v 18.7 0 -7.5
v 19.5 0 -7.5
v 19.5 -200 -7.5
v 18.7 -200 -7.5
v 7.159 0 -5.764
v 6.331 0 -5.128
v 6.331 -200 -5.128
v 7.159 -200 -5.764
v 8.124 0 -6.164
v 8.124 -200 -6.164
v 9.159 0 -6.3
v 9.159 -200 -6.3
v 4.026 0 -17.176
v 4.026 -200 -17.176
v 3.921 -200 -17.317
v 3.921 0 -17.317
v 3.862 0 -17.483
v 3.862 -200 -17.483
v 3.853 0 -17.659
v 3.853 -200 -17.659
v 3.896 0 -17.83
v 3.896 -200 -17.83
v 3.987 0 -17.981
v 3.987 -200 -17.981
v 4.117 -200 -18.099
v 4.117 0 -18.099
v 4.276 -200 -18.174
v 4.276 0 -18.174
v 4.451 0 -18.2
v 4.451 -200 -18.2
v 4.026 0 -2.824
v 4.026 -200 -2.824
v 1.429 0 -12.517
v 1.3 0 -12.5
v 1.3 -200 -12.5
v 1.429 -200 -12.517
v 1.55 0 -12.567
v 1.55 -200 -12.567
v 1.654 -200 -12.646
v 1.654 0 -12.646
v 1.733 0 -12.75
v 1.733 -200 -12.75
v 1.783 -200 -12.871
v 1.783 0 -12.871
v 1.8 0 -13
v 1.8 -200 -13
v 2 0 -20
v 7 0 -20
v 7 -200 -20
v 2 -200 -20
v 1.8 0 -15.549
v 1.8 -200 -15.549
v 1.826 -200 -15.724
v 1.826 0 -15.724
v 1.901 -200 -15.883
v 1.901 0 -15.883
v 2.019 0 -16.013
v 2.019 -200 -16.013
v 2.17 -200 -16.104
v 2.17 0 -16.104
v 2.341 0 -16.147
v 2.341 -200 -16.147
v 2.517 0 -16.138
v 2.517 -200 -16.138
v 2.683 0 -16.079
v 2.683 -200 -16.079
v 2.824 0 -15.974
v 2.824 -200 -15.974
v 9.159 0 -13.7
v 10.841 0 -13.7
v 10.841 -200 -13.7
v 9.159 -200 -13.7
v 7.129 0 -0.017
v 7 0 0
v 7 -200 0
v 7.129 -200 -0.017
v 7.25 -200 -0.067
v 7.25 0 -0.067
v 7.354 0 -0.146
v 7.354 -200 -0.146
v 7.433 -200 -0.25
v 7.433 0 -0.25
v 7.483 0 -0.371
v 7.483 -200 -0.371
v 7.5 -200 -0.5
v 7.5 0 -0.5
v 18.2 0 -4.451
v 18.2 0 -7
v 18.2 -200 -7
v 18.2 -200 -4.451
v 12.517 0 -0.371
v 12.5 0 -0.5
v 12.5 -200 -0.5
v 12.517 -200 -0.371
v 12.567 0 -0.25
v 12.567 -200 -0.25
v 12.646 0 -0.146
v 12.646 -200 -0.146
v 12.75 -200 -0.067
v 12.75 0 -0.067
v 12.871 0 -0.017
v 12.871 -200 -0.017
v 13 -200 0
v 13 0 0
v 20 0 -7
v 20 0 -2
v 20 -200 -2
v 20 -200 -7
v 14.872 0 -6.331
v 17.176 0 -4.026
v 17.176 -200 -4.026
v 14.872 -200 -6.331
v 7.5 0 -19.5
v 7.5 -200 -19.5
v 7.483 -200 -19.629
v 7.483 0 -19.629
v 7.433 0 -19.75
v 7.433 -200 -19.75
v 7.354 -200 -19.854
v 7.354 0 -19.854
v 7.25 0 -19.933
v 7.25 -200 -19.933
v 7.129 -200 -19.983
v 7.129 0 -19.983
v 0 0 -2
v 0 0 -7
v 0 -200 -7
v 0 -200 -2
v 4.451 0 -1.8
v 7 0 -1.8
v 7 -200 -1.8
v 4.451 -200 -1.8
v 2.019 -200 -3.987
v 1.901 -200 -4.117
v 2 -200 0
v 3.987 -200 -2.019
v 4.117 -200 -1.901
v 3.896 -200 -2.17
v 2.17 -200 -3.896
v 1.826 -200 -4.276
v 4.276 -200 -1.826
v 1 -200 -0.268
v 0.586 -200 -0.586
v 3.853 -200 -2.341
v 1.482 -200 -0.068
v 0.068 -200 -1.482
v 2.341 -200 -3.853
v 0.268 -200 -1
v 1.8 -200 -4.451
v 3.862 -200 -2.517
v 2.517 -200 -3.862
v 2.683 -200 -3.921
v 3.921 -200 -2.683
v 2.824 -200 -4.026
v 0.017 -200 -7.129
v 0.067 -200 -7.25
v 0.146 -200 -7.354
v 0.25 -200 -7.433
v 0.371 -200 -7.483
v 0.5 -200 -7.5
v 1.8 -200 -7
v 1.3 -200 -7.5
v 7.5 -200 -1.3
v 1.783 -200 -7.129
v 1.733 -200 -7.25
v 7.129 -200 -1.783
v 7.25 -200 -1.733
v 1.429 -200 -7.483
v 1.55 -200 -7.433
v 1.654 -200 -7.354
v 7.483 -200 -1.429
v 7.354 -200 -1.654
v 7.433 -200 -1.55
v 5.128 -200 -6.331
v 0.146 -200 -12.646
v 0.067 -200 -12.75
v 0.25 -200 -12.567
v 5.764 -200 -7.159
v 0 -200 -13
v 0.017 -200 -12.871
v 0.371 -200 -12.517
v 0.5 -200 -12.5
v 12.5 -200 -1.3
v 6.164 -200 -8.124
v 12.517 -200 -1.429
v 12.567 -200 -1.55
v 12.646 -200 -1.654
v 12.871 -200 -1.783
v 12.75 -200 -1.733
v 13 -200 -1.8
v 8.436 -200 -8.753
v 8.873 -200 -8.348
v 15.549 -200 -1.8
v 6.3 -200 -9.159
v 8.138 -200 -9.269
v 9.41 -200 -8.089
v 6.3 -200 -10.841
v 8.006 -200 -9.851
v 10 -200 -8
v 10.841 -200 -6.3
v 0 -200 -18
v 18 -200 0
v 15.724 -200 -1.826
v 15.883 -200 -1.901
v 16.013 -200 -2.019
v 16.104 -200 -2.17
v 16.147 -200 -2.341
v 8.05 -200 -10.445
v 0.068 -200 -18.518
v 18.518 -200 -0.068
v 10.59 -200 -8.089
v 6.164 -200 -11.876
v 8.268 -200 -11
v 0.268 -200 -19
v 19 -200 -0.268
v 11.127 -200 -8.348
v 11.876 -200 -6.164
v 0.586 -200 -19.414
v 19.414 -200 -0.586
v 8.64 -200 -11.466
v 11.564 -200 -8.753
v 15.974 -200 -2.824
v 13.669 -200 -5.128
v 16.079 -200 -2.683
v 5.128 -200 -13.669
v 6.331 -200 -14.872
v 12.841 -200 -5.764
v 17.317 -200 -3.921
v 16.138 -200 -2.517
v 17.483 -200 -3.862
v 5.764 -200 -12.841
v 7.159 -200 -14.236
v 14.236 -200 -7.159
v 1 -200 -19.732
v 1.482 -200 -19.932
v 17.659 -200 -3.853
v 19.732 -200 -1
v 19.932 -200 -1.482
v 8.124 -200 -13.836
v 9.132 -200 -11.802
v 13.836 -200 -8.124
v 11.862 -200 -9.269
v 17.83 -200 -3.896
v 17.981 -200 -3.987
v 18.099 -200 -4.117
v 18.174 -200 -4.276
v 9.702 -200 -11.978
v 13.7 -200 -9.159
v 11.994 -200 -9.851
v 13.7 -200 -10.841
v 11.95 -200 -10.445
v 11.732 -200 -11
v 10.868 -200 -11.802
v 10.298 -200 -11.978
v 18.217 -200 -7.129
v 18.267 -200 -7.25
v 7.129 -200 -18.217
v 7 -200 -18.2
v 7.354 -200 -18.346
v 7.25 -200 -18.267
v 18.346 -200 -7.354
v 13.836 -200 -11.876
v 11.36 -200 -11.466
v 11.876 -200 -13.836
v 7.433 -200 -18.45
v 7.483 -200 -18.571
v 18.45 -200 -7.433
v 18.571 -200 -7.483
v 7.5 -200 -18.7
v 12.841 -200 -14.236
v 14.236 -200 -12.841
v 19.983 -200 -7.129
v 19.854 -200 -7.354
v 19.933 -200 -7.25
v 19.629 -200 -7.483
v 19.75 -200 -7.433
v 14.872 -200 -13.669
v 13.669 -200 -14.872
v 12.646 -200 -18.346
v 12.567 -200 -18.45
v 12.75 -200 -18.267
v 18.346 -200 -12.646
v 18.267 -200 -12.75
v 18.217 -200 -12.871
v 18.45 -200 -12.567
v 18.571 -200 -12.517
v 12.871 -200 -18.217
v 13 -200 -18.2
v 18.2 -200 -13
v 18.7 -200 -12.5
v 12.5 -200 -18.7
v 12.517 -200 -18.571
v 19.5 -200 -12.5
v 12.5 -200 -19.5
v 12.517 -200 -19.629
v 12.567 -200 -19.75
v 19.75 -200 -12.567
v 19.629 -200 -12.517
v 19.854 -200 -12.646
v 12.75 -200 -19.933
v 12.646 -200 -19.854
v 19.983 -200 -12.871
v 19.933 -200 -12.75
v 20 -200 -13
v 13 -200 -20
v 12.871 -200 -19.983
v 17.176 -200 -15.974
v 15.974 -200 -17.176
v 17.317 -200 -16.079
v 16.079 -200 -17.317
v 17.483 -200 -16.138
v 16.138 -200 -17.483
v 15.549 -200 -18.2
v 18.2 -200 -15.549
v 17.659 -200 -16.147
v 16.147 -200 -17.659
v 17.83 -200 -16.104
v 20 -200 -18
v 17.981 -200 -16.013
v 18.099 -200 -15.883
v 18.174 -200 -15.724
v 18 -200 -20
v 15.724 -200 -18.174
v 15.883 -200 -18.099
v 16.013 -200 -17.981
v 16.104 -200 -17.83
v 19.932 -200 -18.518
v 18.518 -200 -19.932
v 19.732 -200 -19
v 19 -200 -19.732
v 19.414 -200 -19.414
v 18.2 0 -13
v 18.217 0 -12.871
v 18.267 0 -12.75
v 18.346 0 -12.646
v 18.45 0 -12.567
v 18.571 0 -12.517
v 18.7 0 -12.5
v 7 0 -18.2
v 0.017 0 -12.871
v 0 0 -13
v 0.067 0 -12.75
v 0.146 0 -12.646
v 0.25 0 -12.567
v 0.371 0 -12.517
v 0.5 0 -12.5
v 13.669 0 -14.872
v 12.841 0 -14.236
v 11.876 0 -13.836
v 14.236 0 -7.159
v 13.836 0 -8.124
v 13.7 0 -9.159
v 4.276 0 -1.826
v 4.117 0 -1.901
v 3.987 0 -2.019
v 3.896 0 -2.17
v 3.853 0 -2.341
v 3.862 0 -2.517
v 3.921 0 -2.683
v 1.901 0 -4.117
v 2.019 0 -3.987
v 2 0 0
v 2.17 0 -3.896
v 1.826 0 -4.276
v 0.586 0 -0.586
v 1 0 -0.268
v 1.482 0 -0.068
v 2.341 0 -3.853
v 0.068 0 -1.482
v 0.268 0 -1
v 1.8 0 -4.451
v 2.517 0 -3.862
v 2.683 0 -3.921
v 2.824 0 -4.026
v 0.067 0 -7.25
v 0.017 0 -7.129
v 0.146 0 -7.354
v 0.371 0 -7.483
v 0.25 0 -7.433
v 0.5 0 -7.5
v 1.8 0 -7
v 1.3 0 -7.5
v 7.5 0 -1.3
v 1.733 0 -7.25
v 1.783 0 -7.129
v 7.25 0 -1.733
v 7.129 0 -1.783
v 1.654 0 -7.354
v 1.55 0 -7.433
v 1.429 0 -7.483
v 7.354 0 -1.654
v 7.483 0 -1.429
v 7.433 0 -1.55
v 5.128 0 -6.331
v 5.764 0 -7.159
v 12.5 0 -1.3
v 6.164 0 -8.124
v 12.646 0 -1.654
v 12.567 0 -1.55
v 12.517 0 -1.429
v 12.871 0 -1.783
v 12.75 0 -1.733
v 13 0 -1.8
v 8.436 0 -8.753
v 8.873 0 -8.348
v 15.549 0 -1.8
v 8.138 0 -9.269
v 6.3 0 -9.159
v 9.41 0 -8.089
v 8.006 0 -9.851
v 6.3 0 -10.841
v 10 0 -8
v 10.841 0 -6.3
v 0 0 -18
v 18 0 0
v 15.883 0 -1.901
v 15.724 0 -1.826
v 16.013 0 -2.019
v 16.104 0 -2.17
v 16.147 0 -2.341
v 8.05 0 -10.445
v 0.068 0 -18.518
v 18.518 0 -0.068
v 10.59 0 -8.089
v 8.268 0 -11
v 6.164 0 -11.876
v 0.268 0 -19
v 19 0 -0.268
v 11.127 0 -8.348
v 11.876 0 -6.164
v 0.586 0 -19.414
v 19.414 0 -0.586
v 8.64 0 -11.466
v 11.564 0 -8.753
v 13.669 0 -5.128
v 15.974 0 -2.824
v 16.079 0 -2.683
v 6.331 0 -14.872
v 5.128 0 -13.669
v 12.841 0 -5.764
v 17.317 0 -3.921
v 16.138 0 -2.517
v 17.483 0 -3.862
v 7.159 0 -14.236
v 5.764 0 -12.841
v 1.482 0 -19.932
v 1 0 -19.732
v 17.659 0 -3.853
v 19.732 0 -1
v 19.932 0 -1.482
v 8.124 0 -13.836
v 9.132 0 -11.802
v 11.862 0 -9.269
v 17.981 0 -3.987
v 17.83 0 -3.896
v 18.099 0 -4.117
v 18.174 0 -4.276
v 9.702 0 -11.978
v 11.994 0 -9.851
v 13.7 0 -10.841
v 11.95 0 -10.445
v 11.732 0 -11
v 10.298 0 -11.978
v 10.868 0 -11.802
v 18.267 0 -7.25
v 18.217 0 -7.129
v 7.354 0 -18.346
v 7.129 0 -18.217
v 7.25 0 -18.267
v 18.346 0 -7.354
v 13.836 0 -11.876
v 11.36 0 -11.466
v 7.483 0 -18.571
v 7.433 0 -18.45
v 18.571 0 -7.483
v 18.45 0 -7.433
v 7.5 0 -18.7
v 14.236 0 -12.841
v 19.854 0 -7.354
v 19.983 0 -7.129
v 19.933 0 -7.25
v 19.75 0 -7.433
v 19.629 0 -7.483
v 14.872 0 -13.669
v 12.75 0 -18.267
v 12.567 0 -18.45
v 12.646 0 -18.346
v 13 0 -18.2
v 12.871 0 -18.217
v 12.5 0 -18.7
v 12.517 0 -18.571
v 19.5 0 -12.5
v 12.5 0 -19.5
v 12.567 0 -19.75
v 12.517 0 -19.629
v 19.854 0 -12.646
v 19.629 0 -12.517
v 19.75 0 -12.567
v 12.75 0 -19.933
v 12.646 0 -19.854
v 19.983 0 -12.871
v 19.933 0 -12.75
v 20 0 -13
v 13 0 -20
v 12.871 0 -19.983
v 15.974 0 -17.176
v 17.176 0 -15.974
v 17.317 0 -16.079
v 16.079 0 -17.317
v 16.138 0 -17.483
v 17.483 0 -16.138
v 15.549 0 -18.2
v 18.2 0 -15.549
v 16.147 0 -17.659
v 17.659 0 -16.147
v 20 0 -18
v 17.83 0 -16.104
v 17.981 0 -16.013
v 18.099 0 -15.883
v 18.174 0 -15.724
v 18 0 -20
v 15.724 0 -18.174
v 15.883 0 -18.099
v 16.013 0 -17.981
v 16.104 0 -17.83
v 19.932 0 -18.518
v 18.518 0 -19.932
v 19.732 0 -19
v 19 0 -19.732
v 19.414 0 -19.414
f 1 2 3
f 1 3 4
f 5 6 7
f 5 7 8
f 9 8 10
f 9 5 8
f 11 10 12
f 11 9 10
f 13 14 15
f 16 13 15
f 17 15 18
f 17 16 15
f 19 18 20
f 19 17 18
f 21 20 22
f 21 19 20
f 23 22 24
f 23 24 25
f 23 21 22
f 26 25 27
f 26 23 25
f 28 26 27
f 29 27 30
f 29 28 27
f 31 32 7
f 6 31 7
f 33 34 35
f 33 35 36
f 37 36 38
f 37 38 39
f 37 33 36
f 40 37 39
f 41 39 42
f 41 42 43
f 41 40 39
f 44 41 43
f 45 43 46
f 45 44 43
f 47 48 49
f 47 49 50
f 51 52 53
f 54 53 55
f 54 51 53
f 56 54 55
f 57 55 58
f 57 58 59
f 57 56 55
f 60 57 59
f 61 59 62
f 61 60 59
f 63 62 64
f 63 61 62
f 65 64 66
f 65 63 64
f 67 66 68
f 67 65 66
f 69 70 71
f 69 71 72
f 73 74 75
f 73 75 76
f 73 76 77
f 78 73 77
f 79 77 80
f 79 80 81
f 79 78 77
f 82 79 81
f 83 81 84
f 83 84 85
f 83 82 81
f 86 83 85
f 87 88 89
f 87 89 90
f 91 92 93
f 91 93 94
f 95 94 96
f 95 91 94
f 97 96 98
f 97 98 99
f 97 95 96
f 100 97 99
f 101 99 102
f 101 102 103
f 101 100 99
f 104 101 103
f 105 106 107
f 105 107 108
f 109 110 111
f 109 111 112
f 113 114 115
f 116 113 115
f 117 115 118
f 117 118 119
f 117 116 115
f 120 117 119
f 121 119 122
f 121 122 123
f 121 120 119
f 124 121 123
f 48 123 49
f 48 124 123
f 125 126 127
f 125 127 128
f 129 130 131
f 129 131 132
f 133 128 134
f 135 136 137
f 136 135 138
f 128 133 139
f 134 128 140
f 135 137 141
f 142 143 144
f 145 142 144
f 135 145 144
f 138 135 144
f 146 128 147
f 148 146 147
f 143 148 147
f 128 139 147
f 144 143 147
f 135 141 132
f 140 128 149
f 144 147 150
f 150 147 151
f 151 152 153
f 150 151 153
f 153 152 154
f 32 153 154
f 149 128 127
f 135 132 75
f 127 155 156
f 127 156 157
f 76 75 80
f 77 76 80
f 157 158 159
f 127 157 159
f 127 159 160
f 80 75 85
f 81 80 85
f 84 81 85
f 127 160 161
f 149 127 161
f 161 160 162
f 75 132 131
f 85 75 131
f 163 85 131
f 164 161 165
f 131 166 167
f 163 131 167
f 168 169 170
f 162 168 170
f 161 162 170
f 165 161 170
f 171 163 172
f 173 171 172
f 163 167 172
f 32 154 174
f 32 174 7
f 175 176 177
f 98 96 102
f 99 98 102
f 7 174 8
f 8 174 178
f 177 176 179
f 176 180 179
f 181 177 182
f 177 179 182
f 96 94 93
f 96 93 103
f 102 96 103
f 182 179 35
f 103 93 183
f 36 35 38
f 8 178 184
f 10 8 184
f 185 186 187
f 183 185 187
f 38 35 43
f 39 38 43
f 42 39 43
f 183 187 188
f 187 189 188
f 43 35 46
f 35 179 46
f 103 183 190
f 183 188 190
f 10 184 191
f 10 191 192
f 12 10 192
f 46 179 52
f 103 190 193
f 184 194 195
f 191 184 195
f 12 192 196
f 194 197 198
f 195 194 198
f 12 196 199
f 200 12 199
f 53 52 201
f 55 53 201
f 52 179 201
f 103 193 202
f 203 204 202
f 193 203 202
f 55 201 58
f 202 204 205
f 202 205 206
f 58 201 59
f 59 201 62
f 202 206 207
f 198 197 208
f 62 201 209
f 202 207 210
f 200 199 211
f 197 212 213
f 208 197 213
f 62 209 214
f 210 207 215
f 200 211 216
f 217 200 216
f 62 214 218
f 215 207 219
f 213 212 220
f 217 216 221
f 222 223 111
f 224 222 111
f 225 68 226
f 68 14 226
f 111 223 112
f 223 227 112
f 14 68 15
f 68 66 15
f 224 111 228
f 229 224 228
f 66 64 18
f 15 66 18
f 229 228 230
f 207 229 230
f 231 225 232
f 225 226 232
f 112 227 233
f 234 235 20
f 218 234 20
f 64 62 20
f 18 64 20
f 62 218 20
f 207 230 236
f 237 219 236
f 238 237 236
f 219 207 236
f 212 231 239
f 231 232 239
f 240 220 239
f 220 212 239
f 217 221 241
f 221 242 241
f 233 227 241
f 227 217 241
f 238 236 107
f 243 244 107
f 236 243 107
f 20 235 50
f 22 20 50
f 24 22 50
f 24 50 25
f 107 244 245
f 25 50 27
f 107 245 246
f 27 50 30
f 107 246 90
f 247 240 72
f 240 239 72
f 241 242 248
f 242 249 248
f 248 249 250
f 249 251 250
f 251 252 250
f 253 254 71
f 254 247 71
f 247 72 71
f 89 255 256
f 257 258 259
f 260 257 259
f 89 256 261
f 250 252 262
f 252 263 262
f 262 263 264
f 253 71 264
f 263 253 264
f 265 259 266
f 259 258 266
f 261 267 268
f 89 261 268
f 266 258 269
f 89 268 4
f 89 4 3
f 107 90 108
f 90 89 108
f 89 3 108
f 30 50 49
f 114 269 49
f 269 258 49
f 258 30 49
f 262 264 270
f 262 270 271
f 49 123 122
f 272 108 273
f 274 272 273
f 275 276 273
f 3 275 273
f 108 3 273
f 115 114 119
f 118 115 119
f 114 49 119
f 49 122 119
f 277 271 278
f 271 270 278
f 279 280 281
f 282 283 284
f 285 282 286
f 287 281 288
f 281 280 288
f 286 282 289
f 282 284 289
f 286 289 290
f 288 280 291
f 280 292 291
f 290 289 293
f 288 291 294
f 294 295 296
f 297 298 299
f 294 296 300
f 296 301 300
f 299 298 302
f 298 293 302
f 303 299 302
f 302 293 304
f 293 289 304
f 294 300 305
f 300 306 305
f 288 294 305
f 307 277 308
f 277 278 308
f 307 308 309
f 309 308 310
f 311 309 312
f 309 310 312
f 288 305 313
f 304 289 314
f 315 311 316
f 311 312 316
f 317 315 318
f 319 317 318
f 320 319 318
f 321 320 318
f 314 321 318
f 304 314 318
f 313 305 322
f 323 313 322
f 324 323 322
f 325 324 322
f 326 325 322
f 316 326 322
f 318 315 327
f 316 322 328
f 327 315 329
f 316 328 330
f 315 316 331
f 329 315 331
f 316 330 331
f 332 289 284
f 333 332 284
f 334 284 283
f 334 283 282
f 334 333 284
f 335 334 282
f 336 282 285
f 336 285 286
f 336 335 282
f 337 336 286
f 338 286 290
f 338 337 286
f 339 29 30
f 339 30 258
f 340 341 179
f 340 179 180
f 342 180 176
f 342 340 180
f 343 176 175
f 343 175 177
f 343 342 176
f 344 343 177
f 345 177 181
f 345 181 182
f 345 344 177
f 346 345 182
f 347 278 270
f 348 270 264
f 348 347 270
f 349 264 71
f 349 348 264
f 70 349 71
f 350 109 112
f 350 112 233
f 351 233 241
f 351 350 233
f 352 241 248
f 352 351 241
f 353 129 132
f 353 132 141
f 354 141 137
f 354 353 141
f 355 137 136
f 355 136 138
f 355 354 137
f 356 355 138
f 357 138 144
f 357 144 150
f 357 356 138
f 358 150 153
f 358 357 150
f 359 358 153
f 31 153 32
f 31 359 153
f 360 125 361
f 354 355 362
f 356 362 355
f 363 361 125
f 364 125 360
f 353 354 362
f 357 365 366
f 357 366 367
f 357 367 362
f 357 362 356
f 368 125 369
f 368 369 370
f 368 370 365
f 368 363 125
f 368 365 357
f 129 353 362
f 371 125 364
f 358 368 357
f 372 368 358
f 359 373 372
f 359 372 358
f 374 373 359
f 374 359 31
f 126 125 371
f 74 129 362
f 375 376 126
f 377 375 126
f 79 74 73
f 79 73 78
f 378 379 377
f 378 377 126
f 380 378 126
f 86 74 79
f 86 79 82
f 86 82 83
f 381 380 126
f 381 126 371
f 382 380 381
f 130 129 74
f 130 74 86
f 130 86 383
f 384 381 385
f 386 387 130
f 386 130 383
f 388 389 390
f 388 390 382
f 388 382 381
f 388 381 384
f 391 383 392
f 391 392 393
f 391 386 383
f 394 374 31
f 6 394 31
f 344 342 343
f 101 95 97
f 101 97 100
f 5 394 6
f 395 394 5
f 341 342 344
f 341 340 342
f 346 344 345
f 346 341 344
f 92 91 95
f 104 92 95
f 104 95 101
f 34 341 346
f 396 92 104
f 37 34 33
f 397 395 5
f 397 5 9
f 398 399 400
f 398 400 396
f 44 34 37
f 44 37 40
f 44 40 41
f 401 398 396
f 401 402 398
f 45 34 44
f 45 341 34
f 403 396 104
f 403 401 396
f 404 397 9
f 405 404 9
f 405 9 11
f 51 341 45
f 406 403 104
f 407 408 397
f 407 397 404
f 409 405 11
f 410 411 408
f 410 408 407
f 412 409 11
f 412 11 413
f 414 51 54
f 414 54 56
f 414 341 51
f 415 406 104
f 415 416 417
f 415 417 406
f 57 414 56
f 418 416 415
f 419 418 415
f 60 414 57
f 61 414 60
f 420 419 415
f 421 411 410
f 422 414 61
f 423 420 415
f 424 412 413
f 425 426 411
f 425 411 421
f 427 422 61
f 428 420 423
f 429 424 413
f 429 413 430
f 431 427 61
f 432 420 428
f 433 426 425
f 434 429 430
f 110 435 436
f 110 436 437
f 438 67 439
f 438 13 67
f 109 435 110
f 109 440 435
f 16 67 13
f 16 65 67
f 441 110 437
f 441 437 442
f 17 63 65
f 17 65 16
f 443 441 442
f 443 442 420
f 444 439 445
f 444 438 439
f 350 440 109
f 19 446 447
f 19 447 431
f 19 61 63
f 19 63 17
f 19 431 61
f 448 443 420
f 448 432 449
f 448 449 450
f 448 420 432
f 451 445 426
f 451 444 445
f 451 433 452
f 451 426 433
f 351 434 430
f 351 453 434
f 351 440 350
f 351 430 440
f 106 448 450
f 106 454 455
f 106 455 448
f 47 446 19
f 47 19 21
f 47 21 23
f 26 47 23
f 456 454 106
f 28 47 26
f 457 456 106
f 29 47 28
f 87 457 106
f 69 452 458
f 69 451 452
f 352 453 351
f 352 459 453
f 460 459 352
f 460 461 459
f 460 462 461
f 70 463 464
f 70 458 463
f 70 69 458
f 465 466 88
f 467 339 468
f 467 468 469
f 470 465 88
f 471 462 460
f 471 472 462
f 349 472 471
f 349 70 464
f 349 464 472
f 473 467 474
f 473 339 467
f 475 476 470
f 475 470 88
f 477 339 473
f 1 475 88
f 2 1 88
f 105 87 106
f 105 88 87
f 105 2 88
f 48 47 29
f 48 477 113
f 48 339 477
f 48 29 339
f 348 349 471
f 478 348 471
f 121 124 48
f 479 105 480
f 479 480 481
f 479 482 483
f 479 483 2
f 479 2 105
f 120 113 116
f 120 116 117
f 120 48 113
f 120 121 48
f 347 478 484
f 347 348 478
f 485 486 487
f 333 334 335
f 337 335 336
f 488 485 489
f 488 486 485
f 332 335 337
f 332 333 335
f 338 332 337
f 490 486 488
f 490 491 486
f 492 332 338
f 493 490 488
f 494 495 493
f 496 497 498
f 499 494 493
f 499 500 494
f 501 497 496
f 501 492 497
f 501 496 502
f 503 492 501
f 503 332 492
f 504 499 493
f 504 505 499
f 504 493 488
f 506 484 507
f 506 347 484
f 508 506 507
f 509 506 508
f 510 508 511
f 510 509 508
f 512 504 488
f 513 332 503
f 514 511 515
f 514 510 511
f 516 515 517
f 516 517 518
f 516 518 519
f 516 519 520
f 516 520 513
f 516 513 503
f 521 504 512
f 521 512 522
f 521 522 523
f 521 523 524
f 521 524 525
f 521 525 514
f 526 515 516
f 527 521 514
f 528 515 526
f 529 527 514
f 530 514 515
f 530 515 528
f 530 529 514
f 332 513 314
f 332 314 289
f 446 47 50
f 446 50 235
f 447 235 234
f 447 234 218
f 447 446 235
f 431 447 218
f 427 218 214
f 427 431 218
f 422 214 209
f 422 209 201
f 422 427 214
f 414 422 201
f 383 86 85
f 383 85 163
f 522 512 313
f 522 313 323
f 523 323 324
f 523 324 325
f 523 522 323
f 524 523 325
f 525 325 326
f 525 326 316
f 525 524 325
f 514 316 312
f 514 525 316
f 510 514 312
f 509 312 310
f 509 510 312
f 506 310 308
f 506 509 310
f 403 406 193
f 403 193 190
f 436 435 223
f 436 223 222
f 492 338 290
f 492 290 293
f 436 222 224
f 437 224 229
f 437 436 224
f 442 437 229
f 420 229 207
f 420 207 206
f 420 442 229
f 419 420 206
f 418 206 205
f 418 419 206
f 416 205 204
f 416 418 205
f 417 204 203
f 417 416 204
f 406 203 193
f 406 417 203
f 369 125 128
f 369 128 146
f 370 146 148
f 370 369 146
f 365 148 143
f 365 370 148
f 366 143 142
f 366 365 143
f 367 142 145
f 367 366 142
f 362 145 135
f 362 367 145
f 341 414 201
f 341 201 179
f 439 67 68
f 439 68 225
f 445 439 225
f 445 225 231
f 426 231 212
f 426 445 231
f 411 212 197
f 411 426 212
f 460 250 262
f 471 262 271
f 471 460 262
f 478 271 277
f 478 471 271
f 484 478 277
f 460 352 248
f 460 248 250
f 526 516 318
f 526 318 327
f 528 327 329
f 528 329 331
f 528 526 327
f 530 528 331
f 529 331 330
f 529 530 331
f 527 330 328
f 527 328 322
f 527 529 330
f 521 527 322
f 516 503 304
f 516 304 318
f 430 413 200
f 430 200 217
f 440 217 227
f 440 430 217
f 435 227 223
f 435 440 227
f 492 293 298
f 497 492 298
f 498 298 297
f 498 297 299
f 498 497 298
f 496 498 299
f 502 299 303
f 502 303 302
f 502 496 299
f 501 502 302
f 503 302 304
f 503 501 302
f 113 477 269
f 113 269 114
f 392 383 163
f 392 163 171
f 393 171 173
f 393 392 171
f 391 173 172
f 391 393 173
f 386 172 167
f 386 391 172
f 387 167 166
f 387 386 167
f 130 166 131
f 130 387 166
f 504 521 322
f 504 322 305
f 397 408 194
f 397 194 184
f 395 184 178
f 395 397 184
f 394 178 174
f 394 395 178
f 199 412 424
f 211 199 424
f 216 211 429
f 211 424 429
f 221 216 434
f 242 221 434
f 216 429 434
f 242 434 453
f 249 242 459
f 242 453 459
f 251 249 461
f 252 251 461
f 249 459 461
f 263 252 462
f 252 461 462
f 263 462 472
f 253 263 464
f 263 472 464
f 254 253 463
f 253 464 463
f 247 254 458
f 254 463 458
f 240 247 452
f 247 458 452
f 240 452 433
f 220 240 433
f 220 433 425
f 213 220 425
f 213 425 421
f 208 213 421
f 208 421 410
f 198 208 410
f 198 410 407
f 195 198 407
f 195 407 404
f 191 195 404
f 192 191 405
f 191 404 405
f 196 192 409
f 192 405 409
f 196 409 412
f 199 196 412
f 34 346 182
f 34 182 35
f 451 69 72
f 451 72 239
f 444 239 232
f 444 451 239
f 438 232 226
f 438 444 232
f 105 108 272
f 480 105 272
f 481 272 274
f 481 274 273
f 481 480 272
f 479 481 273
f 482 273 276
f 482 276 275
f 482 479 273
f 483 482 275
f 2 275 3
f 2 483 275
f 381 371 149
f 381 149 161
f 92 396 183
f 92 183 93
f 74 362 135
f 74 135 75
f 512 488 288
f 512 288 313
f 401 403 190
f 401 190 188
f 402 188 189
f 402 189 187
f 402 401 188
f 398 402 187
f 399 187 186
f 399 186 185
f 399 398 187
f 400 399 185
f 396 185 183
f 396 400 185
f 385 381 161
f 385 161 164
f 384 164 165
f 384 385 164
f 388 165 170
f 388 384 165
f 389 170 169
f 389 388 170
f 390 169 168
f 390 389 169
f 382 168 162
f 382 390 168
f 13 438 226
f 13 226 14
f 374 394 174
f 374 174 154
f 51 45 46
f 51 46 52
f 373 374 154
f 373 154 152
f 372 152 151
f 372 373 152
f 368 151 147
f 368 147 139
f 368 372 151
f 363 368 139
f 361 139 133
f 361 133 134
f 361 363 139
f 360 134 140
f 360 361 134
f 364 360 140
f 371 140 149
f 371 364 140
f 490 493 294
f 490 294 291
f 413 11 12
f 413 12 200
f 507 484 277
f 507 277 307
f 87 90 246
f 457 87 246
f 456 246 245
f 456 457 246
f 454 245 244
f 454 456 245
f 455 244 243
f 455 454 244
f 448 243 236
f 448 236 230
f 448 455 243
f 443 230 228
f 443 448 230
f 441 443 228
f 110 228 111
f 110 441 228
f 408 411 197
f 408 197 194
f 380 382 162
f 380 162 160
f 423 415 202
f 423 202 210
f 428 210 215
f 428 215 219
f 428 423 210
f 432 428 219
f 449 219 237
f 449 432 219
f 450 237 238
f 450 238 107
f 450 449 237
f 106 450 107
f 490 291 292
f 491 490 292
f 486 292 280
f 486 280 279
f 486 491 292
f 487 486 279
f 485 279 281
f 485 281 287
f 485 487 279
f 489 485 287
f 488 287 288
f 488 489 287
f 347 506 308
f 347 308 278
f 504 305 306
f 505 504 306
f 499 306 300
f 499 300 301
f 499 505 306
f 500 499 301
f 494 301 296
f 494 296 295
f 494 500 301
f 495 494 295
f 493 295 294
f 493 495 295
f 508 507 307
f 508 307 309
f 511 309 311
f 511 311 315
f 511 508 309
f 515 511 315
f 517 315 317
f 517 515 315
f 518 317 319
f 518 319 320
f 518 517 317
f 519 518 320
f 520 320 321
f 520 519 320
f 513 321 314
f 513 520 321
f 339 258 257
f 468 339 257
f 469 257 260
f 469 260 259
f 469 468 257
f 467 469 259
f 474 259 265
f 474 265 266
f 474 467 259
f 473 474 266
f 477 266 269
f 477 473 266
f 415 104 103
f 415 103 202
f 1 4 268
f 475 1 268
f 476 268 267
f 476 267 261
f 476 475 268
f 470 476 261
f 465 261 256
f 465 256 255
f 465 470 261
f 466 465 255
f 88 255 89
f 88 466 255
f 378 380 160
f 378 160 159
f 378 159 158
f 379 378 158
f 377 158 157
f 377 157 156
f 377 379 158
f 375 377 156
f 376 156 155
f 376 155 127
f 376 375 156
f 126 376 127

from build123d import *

# Parameters (mm, degrees)
SKETCH1_R           = 2
BOSS_EXTRUDE1_DEPTH = 200


with BuildPart() as part:
    # Sketch1 → Boss-Extrude1 (new body)
    with BuildSketch(Plane(origin=(0, 0, 0), x_dir=(1, 0, 0), z_dir=(0, 1, 0))):
        with BuildLine():
            Line((2.824264069, 15.973654403), (5.128427125, 13.669491347))
            ThreePointArc((5.128427125, 13.669491347), (5.99551813, 12.371797952), (6.3, 10.841064222))
            Line((6.3, 10.841064222), (6.3, 9.158935778))
            ThreePointArc((6.3, 9.158935778), (5.99551813, 7.628202048), (5.128427125, 6.330508653))
            Line((5.128427125, 6.330508653), (2.824264069, 4.026345597))
            ThreePointArc((2.824264069, 4.026345597), (2.170389941, 3.896281946), (1.8, 4.450609665))
            Line((1.8, 4.450609665), (1.8, 7))
            ThreePointArc((1.8, 7), (1.653553391, 7.353553391), (1.3, 7.5))
            Line((1.3, 7.5), (0.5, 7.5))
            ThreePointArc((0.5, 7.5), (0.146446609, 7.353553391), (0, 7))
            Line((0, 7), (0, 2))
            ThreePointArc((0, 2), (0.585786438, 0.585786438), (2, 0))
            Line((2, 0), (7, 0))
            ThreePointArc((7, 0), (7.353553391, 0.146446609), (7.5, 0.5))
            Line((7.5, 0.5), (7.5, 1.3))
            ThreePointArc((7.5, 1.3), (7.353553391, 1.653553391), (7, 1.8))
            Line((7, 1.8), (4.450609665, 1.8))
            ThreePointArc((4.450609665, 1.8), (3.896281946, 2.170389941), (4.026345597, 2.824264069))
            Line((4.026345597, 2.824264069), (6.330508653, 5.128427125))
            ThreePointArc((6.330508653, 5.128427125), (7.628202048, 5.99551813), (9.158935778, 6.3))
            Line((9.158935778, 6.3), (10.841064222, 6.3))
            ThreePointArc((10.841064222, 6.3), (12.371797952, 5.99551813), (13.669491347, 5.128427125))
            Line((13.669491347, 5.128427125), (15.973654403, 2.824264069))
            ThreePointArc((15.973654403, 2.824264069), (16.103718054, 2.170389941), (15.549390335, 1.8))
            Line((15.549390335, 1.8), (13, 1.8))
            ThreePointArc((13, 1.8), (12.646446609, 1.653553391), (12.5, 1.3))
            Line((12.5, 1.3), (12.5, 0.5))
            ThreePointArc((12.5, 0.5), (12.646446609, 0.146446609), (13, 0))
            Line((13, 0), (18, 0))
            ThreePointArc((18, 0), (19.414213562, 0.585786438), (20, 2))
            Line((20, 2), (20, 7))
            ThreePointArc((20, 7), (19.853553391, 7.353553391), (19.5, 7.5))
            Line((19.5, 7.5), (18.7, 7.5))
            ThreePointArc((18.7, 7.5), (18.346446609, 7.353553391), (18.2, 7))
            Line((18.2, 7), (18.2, 4.450609665))
            ThreePointArc((18.2, 4.450609665), (17.829610059, 3.896281946), (17.175735931, 4.026345597))
            Line((17.175735931, 4.026345597), (14.871572875, 6.330508653))
            ThreePointArc((14.871572875, 6.330508653), (14.00448187, 7.628202048), (13.7, 9.158935778))
            Line((13.7, 9.158935778), (13.7, 10.841064222))
            ThreePointArc((13.7, 10.841064222), (14.00448187, 12.371797952), (14.871572875, 13.669491347))
            Line((14.871572875, 13.669491347), (17.175735931, 15.973654403))
            ThreePointArc((17.175735931, 15.973654403), (17.829610059, 16.103718054), (18.2, 15.549390335))
            Line((18.2, 15.549390335), (18.2, 13))
            ThreePointArc((18.2, 13), (18.346446609, 12.646446609), (18.7, 12.5))
            Line((18.7, 12.5), (19.5, 12.5))
            ThreePointArc((19.5, 12.5), (19.853553391, 12.646446609), (20, 13))
            Line((20, 13), (20, 18))
            ThreePointArc((20, 18), (19.414213562, 19.414213562), (18, 20))
            Line((18, 20), (13, 20))
            ThreePointArc((13, 20), (12.646446609, 19.853553391), (12.5, 19.5))
            Line((12.5, 19.5), (12.5, 18.7))
            ThreePointArc((12.5, 18.7), (12.646446609, 18.346446609), (13, 18.2))
            Line((13, 18.2), (15.549390335, 18.2))
            ThreePointArc((15.549390335, 18.2), (16.103718054, 17.829610059), (15.973654403, 17.175735931))
            Line((15.973654403, 17.175735931), (13.669491347, 14.871572875))
            ThreePointArc((13.669491347, 14.871572875), (12.371797952, 14.00448187), (10.841064222, 13.7))
            Line((10.841064222, 13.7), (9.158935778, 13.7))
            ThreePointArc((9.158935778, 13.7), (7.628202048, 14.00448187), (6.330508653, 14.871572875))
            Line((6.330508653, 14.871572875), (4.026345597, 17.175735931))
            ThreePointArc((4.026345597, 17.175735931), (3.896281946, 17.829610059), (4.450609665, 18.2))
            Line((4.450609665, 18.2), (7, 18.2))
            ThreePointArc((7, 18.2), (7.353553391, 18.346446609), (7.5, 18.7))
            Line((7.5, 18.7), (7.5, 19.5))
            ThreePointArc((7.5, 19.5), (7.353553391, 19.853553391), (7, 20))
            Line((7, 20), (2, 20))
            ThreePointArc((2, 20), (0.585786438, 19.414213562), (0, 18))
            Line((0, 18), (0, 13))
            ThreePointArc((0, 13), (0.146446609, 12.646446609), (0.5, 12.5))
            Line((0.5, 12.5), (1.3, 12.5))
            ThreePointArc((1.3, 12.5), (1.653553391, 12.646446609), (1.8, 13))
            Line((1.8, 13), (1.8, 15.549390335))
            ThreePointArc((1.8, 15.549390335), (2.170389941, 16.103718054), (2.824264069, 15.973654403))
        make_face()
        with Locations(Location((10, 10, 0), (0, 0, 270))):
            Circle(SKETCH1_R, mode=Mode.SUBTRACT)
    extrude(amount=-BOSS_EXTRUDE1_DEPTH)


solid = part.part
